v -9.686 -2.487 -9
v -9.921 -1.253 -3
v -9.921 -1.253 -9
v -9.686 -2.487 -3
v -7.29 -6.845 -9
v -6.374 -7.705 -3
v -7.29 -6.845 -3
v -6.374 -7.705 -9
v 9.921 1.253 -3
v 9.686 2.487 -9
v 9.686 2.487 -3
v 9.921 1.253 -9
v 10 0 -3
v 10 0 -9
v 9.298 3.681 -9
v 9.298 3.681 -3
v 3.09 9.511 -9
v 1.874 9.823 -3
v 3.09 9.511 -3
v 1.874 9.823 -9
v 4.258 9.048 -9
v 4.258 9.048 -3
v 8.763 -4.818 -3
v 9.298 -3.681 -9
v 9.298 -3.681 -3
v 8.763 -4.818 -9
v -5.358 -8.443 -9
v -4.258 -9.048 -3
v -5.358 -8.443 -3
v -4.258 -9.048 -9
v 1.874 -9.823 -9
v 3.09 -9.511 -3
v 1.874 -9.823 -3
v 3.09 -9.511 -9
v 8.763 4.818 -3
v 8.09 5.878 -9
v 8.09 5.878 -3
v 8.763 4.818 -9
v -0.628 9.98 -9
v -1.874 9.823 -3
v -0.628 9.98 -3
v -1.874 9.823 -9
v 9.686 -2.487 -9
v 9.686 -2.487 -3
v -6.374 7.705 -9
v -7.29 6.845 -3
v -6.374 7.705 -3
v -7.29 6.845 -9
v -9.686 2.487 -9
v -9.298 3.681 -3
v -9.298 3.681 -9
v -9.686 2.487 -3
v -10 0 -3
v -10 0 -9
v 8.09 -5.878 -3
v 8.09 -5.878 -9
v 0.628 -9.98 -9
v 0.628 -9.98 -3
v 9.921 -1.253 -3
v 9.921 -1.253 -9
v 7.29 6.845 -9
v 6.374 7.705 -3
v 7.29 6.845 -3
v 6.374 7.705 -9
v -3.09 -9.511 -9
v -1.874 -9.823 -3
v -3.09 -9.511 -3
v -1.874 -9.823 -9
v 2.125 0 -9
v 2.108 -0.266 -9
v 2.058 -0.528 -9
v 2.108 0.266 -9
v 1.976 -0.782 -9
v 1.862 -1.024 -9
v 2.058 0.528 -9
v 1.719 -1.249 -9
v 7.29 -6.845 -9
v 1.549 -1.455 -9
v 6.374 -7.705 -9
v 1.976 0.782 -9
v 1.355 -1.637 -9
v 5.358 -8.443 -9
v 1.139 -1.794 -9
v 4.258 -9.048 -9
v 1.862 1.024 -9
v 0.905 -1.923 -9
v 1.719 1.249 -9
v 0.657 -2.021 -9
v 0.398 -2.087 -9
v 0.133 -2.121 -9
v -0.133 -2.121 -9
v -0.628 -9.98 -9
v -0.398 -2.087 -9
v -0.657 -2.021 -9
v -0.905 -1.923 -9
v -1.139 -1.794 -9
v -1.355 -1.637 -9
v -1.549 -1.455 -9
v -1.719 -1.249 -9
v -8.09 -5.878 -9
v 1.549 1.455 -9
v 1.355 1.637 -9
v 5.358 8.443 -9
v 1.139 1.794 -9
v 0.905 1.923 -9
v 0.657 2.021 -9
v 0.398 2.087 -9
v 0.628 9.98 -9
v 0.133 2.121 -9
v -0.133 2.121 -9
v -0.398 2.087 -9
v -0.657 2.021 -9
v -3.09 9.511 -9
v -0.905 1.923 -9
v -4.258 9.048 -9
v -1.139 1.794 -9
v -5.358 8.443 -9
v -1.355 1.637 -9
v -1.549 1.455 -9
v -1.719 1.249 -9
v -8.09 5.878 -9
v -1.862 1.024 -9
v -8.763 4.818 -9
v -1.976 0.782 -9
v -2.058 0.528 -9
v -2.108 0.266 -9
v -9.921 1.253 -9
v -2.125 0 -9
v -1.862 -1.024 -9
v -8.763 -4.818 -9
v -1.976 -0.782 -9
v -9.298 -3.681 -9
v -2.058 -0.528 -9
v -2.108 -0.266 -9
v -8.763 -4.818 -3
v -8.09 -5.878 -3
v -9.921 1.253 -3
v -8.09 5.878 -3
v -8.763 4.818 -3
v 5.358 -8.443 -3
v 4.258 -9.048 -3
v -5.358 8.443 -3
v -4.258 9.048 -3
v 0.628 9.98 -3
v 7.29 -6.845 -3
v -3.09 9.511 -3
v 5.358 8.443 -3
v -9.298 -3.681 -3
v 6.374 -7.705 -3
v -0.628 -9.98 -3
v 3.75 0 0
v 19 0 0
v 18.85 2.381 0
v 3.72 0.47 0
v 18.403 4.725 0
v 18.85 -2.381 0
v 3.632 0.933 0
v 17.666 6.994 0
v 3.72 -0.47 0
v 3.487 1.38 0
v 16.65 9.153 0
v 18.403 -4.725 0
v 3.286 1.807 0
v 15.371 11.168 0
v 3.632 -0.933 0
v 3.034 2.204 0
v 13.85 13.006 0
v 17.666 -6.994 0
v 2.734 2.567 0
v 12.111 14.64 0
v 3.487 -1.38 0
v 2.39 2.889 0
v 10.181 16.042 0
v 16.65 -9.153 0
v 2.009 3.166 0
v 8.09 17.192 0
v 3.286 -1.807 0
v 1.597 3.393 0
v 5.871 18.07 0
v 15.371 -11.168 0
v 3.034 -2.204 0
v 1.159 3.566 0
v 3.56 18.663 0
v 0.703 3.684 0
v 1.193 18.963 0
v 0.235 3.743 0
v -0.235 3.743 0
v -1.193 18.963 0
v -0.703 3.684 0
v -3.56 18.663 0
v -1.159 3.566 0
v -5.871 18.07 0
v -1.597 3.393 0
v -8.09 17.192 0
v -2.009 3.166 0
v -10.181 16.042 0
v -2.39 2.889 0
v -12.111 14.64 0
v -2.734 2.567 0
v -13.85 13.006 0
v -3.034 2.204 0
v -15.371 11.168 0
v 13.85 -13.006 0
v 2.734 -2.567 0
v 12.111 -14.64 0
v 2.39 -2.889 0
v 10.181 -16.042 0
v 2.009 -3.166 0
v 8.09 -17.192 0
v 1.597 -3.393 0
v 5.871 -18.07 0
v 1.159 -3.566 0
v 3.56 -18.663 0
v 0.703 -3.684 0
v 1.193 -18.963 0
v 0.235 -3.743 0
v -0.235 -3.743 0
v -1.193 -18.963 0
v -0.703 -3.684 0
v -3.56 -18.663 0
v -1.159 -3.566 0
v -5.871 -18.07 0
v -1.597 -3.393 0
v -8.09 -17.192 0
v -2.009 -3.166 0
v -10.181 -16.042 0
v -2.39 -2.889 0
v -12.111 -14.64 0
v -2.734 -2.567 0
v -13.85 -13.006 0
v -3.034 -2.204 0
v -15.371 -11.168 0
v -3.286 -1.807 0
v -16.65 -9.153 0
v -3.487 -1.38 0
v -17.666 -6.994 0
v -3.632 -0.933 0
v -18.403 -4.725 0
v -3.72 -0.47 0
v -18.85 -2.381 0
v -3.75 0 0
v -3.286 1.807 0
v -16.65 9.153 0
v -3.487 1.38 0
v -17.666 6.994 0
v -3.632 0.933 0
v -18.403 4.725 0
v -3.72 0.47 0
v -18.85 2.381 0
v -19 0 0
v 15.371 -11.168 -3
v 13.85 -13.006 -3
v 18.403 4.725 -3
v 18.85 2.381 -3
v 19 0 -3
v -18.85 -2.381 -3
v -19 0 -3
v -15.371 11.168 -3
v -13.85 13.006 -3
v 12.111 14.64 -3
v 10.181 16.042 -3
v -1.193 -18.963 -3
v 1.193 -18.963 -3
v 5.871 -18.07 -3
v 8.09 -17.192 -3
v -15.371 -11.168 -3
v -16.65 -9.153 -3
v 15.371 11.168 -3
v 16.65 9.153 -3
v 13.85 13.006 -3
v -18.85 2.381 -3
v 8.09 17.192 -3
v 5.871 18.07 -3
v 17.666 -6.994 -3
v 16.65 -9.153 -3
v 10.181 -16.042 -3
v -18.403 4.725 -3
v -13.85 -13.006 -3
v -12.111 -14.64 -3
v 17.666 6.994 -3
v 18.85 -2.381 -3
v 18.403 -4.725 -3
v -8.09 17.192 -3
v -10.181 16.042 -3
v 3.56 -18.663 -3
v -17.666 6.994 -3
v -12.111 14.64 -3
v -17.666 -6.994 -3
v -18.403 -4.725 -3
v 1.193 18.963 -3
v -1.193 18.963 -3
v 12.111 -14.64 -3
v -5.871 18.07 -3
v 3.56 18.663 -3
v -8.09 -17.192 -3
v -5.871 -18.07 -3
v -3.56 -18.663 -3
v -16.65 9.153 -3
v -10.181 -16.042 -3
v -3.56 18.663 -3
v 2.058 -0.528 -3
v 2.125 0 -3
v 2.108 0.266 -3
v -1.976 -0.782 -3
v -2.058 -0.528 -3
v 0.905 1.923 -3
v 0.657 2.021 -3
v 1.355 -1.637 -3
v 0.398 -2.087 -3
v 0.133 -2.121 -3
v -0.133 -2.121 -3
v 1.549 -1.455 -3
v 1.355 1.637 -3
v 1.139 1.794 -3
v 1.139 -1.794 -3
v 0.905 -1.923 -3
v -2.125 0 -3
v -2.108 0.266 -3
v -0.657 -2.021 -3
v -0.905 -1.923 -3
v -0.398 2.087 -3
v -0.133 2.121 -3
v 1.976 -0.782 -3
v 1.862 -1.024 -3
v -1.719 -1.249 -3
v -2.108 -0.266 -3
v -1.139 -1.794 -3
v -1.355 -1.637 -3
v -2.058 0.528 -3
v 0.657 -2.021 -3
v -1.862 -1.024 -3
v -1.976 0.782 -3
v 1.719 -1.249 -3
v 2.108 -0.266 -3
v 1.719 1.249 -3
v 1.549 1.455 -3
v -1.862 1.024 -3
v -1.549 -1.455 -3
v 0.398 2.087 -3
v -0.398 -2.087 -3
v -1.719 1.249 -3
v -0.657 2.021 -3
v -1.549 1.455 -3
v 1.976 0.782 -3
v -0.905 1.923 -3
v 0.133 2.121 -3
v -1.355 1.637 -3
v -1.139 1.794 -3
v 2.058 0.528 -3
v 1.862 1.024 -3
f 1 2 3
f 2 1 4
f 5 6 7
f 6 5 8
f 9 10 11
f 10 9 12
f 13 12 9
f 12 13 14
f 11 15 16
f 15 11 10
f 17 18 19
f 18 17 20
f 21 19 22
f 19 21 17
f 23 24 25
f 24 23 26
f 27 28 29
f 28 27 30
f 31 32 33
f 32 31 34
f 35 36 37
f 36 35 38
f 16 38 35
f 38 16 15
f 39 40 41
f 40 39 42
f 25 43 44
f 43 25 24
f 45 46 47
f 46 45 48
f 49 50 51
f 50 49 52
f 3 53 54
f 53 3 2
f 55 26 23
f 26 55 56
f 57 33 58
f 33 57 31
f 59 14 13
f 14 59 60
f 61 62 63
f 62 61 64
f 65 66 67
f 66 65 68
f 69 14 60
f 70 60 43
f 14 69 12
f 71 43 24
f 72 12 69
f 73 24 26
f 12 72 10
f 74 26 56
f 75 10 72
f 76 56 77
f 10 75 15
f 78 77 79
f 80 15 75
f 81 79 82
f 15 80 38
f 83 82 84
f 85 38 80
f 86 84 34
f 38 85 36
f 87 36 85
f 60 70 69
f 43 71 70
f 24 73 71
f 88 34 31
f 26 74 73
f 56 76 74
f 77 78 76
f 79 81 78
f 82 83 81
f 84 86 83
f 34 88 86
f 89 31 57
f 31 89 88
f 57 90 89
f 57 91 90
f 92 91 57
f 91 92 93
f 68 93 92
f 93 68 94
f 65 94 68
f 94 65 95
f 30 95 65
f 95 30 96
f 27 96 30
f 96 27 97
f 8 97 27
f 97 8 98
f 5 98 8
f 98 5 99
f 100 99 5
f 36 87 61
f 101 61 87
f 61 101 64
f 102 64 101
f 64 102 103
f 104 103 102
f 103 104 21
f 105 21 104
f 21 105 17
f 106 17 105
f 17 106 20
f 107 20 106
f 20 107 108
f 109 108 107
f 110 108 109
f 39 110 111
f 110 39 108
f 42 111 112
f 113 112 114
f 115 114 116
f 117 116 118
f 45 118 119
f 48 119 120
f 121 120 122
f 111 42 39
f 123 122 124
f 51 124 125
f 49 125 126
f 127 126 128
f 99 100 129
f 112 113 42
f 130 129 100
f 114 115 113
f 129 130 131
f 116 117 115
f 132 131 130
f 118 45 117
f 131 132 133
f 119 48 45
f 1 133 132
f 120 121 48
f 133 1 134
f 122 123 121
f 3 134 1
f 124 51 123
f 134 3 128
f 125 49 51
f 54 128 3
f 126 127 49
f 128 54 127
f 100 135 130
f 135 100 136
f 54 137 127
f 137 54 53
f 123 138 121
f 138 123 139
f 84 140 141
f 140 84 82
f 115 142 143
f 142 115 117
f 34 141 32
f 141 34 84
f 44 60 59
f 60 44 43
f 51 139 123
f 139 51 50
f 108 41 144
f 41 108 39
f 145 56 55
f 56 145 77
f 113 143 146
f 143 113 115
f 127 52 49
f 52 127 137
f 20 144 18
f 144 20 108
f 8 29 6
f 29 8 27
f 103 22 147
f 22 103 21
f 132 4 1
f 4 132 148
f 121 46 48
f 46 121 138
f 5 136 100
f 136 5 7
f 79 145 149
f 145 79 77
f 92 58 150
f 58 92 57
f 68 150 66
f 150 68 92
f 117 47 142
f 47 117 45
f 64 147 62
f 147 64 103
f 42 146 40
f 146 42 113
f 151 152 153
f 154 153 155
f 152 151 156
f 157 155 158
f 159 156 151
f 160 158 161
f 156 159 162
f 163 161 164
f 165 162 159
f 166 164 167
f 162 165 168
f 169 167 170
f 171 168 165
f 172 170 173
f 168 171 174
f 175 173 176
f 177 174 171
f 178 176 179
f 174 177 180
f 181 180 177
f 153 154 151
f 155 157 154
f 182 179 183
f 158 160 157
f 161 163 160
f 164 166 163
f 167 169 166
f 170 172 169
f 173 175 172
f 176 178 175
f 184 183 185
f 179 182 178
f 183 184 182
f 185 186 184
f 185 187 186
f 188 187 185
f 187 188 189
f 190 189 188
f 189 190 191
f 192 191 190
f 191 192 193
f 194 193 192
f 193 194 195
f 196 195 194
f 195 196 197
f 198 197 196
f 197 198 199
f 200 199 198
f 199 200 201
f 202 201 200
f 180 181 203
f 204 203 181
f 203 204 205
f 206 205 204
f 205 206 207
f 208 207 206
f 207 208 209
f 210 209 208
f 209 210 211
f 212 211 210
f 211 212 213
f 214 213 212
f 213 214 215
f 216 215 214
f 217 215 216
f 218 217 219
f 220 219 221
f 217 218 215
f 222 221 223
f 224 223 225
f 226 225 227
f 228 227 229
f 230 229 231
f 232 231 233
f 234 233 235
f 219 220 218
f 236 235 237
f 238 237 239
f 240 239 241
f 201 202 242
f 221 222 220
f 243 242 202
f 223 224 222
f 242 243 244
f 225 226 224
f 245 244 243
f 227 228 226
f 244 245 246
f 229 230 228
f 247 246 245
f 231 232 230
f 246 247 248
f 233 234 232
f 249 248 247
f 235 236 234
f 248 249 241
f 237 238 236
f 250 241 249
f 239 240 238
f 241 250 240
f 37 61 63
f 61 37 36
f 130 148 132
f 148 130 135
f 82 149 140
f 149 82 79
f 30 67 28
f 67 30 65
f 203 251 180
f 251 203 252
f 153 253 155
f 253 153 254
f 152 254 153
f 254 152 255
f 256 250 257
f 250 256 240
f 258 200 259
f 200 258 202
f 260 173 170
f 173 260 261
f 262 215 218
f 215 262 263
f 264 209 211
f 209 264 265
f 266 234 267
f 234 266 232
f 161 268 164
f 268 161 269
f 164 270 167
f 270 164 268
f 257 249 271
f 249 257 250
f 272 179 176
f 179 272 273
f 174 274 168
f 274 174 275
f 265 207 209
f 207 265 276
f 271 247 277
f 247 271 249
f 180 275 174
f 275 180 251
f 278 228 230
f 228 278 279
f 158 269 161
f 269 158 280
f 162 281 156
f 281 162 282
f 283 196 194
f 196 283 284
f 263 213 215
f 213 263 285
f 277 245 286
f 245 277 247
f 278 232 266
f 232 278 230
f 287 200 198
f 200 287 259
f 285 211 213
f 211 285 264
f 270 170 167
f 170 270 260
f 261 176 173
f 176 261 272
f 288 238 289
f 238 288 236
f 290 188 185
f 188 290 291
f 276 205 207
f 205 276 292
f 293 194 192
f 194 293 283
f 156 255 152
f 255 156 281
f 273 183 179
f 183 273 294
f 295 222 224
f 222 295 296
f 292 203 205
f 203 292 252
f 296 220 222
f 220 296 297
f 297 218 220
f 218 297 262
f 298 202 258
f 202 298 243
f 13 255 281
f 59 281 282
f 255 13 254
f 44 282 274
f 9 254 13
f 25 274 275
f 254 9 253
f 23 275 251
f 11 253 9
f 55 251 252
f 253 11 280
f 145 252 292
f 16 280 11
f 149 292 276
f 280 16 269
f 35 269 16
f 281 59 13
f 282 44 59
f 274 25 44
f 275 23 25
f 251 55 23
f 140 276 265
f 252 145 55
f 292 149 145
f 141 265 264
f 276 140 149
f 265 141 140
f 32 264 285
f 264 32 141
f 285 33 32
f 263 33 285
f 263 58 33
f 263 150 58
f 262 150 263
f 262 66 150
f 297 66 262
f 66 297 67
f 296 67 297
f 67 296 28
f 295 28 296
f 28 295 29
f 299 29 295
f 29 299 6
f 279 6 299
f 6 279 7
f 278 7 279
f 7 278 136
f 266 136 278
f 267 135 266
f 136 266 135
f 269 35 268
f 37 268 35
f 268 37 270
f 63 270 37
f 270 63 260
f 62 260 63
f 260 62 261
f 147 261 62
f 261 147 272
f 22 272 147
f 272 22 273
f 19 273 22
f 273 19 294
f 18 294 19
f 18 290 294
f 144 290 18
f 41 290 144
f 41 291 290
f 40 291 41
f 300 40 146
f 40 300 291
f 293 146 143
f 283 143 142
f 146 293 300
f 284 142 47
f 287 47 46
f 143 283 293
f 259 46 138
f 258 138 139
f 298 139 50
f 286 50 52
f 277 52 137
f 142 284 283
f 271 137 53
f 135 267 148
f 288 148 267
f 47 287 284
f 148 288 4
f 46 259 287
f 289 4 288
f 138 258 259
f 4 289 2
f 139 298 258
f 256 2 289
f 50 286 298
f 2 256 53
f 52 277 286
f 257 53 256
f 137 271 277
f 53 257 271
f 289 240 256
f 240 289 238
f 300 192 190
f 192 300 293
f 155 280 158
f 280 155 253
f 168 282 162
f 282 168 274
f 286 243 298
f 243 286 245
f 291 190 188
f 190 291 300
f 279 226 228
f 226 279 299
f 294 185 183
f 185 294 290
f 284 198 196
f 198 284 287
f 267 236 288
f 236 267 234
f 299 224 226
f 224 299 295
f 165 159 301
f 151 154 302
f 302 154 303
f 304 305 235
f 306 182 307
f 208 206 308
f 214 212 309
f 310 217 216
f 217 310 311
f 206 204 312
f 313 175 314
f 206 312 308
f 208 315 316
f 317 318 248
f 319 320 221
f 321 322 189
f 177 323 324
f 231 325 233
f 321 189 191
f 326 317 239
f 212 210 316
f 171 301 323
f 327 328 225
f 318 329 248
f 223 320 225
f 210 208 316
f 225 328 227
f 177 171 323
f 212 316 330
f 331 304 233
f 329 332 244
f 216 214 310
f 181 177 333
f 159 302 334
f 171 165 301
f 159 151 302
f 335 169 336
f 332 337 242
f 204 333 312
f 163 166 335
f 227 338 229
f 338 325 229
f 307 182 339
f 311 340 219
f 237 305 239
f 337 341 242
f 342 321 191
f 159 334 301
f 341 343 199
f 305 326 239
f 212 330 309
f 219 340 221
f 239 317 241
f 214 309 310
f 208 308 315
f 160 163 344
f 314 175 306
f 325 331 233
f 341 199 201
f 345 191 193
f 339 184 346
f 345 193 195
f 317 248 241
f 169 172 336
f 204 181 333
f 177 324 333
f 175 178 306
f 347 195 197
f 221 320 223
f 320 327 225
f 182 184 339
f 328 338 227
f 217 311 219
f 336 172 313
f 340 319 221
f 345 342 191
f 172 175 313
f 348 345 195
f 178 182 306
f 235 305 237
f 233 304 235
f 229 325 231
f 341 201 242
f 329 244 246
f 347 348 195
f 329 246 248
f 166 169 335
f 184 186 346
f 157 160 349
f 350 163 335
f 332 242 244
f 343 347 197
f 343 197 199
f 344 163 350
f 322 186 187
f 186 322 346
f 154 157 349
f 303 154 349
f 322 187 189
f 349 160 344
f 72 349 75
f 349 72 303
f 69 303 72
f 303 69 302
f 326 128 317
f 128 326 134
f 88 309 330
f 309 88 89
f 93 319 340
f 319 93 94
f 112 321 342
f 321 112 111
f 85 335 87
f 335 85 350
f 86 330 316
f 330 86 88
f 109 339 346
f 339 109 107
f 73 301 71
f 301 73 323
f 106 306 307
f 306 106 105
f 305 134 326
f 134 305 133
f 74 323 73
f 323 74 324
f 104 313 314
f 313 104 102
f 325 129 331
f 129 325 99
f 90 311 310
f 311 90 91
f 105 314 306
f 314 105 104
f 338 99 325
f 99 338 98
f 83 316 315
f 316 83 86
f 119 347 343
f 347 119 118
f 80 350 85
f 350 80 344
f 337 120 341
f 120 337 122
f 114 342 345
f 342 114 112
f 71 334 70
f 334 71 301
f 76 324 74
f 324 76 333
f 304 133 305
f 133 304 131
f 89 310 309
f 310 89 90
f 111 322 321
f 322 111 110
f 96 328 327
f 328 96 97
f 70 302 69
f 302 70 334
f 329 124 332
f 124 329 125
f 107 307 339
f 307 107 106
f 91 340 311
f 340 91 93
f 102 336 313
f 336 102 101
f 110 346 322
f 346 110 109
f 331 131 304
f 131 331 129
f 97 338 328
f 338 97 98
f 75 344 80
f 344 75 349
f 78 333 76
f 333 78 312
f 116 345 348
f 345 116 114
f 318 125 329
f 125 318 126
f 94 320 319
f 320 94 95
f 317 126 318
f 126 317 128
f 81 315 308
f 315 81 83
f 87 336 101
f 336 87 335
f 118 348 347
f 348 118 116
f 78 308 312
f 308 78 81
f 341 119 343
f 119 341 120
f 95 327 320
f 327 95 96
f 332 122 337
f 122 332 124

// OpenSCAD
$fn = 50;


difference() {
	union() {
		translate(v = [0, 0, -9.0000000000]) {
			cylinder(h = 9, r = 10.0000000000);
		}
		translate(v = [0, 0, -3.0000000000]) {
			cylinder(h = 3, r = 19.0000000000);
		}
	}
	union() {
		translate(v = [0, 0, 0]) {
			rotate(a = [0, 0, 0]) {
				difference() {
					union() {
						#translate(v = [0, 0, -9.0000000000]) {
							cylinder(h = 9, r = 2.0000000000);
						}
						#translate(v = [0, 0, -3]) {
							cylinder(h = 3, r = 10.0000000000, r1 = 2.1250000000, r2 = 3.7500000000);
						}
						#translate(v = [0, 0, -9.0000000000]) {
							cylinder(h = 9, r = 2.1250000000);
						}
						#translate(v = [0, 0, -9.0000000000]) {
							cylinder(h = 9, r = 2.0000000000);
						}
					}
					union();
				}
			}
		}
	}
}
